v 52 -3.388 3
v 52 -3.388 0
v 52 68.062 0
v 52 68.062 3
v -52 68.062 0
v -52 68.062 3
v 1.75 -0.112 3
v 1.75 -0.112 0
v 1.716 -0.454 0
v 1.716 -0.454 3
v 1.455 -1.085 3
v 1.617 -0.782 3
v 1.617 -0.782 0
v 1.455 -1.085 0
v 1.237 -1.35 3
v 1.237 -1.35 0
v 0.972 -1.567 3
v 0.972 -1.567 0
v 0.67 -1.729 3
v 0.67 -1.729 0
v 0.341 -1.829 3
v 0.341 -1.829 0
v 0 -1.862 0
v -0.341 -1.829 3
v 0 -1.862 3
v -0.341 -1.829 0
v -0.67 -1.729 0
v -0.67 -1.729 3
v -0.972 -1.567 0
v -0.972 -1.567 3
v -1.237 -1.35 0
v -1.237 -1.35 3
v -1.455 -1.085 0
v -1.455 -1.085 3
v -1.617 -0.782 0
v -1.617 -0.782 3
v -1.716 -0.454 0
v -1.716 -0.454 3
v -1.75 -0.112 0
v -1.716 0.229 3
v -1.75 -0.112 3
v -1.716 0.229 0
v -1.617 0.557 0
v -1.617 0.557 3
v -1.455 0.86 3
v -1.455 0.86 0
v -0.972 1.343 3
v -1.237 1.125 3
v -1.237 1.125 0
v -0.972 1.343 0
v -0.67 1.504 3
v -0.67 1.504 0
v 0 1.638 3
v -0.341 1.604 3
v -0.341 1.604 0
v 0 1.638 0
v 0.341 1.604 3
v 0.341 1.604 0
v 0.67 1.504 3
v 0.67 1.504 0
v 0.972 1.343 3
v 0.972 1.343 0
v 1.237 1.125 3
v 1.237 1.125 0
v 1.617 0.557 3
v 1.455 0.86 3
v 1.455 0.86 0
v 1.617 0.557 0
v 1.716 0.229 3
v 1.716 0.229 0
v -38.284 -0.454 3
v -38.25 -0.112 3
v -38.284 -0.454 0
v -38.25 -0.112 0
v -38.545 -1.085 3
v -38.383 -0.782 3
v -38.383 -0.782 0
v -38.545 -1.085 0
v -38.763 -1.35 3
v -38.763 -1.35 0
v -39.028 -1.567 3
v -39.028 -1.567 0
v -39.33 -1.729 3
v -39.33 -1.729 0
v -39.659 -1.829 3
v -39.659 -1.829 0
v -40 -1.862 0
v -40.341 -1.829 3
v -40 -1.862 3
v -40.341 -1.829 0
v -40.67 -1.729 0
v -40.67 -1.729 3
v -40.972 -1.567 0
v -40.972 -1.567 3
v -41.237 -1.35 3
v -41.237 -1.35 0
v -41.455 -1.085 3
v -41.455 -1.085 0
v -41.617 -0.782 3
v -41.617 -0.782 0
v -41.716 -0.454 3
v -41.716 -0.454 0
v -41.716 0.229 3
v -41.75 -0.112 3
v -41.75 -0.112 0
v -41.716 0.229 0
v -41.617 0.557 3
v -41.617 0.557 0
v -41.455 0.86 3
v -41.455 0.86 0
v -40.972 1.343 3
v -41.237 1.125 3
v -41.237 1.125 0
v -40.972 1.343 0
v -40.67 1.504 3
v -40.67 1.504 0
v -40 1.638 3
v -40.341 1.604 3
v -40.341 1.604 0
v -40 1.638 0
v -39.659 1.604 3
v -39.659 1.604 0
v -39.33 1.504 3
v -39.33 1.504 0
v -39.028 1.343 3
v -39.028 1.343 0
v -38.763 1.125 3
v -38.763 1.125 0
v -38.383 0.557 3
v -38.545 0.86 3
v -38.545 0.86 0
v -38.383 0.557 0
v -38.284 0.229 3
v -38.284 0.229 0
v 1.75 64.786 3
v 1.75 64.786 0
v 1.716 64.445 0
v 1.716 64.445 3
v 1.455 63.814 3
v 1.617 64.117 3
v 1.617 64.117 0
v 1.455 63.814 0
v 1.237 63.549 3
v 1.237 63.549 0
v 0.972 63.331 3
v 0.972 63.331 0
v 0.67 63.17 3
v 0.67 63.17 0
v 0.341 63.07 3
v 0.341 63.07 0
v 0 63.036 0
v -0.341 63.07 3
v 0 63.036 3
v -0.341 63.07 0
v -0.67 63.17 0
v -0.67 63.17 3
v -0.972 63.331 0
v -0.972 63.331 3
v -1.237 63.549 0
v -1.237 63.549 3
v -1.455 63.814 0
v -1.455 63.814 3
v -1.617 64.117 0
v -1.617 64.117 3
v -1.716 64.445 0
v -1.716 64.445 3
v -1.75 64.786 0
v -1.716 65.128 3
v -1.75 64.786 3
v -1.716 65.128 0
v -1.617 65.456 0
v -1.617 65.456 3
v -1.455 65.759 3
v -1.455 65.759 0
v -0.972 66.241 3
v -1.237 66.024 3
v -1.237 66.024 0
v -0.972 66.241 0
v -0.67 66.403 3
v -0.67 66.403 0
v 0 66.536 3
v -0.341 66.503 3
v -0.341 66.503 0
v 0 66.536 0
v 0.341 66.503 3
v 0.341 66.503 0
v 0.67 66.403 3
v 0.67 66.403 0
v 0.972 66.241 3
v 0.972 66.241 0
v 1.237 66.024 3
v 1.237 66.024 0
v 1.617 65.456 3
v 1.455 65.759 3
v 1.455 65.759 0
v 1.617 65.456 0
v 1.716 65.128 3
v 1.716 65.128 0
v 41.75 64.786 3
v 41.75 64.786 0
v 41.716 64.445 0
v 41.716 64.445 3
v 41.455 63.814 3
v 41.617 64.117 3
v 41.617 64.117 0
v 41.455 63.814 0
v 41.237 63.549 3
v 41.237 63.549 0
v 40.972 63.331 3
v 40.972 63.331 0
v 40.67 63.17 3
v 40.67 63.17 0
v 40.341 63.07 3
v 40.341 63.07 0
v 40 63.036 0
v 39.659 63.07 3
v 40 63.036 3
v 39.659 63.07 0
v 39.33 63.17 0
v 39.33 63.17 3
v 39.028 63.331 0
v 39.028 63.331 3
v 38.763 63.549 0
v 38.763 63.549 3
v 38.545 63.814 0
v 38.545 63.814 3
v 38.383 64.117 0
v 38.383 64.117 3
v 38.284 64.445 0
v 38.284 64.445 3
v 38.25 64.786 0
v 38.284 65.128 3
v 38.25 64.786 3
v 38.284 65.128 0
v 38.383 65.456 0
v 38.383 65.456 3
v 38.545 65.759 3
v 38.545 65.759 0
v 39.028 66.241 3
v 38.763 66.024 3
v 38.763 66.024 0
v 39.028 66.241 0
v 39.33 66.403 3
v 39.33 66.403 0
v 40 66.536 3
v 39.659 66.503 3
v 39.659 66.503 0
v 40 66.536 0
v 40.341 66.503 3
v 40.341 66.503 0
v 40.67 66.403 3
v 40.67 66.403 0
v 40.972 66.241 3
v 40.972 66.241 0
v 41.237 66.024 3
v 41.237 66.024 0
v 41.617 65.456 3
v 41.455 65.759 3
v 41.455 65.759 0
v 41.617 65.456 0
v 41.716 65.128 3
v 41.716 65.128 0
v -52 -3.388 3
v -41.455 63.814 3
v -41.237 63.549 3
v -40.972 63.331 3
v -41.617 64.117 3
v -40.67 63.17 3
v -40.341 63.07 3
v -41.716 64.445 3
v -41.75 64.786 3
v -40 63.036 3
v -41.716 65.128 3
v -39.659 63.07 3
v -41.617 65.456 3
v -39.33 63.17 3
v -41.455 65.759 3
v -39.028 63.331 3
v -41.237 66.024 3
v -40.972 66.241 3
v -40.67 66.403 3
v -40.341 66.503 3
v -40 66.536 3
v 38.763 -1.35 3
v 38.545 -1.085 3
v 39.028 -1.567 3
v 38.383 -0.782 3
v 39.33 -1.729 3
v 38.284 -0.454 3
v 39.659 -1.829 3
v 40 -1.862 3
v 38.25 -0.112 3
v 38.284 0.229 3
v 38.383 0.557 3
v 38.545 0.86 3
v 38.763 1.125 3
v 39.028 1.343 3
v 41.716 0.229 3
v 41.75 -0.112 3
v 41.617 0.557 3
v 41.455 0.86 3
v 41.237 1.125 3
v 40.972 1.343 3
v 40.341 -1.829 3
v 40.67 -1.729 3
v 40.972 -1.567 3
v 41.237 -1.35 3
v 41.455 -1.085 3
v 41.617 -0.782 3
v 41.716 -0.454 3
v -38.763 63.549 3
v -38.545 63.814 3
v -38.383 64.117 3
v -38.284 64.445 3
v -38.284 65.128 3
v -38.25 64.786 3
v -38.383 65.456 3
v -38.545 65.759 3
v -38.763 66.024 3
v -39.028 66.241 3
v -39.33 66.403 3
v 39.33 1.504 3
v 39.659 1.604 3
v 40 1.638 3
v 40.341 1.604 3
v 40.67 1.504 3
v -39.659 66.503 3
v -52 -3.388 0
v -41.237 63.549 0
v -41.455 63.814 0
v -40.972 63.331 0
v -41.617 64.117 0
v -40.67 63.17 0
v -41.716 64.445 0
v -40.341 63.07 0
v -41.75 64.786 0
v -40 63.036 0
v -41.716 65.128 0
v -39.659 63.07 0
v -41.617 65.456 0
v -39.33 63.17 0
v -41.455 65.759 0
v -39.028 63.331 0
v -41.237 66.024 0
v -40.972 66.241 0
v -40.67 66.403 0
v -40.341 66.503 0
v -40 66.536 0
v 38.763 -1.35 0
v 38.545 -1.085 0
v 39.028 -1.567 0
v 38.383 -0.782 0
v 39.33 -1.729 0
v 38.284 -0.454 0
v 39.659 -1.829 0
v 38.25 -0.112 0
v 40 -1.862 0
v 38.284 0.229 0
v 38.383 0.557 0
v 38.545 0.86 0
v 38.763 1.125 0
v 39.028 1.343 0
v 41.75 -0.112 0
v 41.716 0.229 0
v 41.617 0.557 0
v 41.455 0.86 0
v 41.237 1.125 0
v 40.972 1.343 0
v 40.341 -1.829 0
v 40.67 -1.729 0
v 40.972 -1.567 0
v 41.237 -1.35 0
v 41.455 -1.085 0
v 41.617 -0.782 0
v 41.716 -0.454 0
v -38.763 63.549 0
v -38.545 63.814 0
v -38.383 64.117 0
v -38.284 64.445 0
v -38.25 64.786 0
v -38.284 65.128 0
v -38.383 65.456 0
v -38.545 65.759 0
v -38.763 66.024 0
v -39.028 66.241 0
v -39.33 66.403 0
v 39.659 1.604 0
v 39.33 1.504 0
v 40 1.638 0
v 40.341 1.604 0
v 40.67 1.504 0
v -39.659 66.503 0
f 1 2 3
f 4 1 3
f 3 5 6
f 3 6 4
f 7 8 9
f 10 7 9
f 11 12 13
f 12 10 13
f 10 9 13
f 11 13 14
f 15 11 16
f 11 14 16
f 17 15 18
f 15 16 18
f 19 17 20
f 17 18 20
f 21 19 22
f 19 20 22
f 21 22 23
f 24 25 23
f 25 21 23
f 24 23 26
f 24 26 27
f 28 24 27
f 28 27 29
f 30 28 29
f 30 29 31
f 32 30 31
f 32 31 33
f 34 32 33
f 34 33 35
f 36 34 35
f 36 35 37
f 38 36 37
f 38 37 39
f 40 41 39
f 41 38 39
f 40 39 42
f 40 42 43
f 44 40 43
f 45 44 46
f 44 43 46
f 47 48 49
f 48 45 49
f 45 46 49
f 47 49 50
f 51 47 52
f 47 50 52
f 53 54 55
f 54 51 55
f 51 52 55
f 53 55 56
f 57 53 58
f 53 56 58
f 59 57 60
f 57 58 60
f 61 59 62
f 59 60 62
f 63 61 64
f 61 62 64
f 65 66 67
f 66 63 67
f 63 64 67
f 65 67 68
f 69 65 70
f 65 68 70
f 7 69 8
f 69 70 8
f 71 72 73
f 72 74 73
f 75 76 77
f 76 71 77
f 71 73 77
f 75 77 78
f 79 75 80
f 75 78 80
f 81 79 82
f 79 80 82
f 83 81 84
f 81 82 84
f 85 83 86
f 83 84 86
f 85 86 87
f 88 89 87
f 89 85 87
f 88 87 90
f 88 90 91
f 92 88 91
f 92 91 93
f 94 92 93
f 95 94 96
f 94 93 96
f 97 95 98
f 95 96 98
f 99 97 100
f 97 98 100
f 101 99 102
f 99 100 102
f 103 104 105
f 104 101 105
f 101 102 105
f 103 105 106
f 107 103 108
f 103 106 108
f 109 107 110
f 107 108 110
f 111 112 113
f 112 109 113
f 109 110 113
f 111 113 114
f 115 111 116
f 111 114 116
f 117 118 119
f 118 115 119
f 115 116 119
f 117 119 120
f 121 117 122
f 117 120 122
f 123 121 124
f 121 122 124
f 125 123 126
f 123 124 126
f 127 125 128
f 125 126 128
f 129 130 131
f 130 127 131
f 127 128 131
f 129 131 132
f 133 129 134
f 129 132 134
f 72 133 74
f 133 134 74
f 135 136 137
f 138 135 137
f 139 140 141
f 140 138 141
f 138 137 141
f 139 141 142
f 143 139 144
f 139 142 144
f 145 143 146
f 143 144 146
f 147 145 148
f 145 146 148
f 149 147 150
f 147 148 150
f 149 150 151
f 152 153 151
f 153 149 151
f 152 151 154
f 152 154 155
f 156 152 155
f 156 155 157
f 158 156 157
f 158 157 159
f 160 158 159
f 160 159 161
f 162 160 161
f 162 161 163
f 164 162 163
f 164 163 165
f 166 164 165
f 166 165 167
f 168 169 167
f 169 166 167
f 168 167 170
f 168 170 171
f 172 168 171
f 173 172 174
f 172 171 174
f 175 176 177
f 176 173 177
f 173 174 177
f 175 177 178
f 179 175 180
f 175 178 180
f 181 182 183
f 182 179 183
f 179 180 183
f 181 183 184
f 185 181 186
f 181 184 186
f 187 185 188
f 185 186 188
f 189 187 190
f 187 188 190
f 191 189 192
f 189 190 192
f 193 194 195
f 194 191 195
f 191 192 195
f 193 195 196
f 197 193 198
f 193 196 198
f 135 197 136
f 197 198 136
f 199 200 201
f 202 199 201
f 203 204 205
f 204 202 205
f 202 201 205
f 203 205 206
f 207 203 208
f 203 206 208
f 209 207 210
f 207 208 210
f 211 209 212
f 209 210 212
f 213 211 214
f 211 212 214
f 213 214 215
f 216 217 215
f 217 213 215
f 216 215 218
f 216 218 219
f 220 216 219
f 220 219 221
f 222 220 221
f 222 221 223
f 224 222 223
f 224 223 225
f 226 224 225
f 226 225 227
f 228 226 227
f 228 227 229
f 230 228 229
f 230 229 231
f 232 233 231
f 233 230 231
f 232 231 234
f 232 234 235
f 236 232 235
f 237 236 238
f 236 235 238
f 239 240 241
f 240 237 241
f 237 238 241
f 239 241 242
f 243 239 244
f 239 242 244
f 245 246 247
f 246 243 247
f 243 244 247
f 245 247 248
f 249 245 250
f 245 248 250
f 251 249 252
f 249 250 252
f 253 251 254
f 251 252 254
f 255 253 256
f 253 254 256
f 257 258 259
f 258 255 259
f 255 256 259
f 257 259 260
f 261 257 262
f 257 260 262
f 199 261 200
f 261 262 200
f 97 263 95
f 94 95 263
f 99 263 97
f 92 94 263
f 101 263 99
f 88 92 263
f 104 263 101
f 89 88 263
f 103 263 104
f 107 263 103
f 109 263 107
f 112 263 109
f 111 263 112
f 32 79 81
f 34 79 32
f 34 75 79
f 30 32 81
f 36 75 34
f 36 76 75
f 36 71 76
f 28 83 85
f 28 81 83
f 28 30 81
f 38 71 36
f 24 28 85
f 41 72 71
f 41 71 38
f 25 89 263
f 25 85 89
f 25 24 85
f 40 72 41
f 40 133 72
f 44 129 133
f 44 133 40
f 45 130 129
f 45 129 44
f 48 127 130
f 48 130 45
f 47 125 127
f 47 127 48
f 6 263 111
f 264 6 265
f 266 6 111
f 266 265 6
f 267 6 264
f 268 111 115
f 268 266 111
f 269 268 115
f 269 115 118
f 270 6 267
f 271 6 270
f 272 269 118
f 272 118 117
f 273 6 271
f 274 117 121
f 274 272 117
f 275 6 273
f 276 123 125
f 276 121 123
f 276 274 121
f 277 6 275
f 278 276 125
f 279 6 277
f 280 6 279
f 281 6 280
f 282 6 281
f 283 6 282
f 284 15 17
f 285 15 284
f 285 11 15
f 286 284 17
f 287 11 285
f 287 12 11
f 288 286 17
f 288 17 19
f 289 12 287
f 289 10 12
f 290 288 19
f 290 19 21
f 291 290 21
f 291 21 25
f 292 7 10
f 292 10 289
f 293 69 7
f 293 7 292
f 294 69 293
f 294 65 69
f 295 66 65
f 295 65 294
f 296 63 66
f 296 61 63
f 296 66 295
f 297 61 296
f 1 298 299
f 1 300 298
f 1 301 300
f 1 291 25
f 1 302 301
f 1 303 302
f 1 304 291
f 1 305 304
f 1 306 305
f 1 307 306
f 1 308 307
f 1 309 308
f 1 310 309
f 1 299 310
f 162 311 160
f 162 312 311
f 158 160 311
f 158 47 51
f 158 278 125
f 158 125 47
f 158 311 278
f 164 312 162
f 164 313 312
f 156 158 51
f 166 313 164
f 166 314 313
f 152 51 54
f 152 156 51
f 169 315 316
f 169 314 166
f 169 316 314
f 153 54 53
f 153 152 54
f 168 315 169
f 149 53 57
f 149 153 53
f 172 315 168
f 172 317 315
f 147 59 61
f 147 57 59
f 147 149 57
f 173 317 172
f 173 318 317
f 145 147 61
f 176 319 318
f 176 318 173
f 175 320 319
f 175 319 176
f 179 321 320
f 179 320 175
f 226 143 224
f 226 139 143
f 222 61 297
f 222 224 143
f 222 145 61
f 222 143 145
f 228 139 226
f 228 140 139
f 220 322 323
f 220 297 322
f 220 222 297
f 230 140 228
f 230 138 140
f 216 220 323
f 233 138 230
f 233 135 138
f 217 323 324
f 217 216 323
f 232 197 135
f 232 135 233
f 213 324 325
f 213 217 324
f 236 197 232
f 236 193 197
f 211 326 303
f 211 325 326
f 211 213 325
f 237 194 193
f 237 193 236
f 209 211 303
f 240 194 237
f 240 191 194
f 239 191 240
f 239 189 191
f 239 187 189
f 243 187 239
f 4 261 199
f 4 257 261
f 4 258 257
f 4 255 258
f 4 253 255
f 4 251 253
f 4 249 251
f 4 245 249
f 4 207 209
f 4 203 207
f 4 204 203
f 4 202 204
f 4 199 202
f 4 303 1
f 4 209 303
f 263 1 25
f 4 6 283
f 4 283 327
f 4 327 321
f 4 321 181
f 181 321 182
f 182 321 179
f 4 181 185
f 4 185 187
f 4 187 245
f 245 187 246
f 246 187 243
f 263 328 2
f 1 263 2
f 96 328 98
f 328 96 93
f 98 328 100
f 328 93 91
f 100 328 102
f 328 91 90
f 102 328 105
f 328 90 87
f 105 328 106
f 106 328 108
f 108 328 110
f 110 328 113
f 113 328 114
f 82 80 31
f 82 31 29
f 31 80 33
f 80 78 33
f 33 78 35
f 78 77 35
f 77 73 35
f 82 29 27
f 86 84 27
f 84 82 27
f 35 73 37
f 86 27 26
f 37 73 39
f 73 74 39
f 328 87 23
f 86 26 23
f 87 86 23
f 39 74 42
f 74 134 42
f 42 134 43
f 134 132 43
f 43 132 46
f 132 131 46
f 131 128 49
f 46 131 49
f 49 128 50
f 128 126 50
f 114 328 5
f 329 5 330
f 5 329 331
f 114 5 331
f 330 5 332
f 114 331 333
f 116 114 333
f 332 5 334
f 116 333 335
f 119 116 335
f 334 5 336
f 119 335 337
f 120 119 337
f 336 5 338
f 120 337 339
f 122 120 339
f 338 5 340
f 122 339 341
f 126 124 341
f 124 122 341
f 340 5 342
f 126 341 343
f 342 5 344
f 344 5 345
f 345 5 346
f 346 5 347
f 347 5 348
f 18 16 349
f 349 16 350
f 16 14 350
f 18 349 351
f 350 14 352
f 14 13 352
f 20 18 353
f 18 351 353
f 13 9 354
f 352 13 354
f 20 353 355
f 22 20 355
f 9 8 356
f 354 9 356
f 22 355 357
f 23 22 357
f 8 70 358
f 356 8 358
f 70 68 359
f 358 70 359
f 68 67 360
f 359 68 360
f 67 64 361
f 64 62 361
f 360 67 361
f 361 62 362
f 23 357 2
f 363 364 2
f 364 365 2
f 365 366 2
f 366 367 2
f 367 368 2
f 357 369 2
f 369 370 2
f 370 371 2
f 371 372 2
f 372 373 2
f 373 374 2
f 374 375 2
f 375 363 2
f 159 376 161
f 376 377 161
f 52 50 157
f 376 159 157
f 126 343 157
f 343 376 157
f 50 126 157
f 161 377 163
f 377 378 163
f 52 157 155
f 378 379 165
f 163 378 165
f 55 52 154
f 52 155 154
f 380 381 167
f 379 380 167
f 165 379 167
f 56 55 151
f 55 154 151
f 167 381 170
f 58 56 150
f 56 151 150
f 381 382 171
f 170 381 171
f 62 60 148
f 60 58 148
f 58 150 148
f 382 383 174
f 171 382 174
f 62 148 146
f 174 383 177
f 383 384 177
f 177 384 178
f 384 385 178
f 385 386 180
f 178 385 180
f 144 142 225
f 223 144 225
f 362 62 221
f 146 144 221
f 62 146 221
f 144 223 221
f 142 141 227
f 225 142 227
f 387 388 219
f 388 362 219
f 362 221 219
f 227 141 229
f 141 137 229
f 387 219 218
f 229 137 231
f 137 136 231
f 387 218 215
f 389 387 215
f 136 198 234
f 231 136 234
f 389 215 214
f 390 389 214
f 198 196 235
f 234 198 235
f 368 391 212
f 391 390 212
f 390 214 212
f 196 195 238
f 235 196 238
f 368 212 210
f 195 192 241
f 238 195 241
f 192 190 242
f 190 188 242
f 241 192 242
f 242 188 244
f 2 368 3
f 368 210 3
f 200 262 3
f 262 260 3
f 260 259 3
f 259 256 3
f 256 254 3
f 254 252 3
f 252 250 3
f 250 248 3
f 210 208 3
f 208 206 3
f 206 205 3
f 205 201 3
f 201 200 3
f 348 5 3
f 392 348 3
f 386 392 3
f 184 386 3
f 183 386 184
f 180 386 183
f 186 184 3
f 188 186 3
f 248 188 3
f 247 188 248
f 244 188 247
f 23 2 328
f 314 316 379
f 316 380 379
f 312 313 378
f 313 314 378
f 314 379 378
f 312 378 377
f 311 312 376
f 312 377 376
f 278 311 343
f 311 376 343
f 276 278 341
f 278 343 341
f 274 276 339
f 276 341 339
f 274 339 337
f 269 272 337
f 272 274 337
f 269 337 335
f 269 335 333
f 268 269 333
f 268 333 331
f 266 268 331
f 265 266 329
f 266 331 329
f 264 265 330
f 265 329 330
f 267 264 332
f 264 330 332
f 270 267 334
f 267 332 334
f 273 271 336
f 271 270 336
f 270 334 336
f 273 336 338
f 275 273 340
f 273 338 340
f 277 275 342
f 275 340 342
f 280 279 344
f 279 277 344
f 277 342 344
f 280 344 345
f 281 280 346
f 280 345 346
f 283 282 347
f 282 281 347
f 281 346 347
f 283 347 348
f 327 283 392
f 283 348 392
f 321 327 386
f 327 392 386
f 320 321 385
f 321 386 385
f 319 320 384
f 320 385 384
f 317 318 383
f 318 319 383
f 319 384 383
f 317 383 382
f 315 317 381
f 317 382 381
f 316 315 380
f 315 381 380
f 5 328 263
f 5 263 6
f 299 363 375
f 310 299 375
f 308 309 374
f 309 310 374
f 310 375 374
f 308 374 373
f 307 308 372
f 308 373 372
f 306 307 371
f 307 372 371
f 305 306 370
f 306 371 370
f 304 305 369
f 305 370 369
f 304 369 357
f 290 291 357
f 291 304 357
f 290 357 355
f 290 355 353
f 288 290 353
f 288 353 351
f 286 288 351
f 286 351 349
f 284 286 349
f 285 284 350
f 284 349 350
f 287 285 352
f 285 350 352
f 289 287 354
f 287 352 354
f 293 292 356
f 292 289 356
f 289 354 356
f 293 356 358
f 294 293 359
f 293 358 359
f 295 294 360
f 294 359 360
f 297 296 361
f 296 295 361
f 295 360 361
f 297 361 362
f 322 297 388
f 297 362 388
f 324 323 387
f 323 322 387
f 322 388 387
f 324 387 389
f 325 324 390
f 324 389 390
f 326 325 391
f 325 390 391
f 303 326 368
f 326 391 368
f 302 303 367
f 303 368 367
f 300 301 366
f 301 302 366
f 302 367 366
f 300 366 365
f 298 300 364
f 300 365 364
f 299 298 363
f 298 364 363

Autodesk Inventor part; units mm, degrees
ref_plane "YZ Plane" through (0, 0, 0) normal (1, 0, 0) x (0, 1, 0)
ref_plane "XZ Plane" through (0, 0, 0) normal (0, 1, 0) x (-1, 0, 0)
ref_plane "XY Plane" through (0, 0, 0) normal (0, 0, 1) x (1, 0, 0)
sketch "Sketch1" plane through (0, 0, 0) normal (0, 0, 1) x (1, 0, 0)
  circle A0 centre (40, -0.1123) radius 1.75 projected
  circle A1 centre (0, -0.1123) radius 1.75 projected
  circle A2 centre (-40, -0.1123) radius 1.75 projected
  line L0 (-44, 3.3877) -> (44, 3.3877) projected
  line L1 (-44, -3.3877) -> (-44, 3.3877) projected
  line L2 (44, -3.3877) -> (-44, -3.3877) projected
  line L3 (44, 3.3877) -> (44, -3.3877) projected
  circle A3 centre (-40, 64.7863) radius 1.75 projected
  circle A4 centre (0, 64.7863) radius 1.75 projected
  circle A5 centre (40, 64.7863) radius 1.75 projected
  line L4 (44, 61.2863) -> (-44, 61.2863) projected
  line L5 (44, 68.0616) -> (44, 61.2863) projected
  line L6 (-44, 68.0616) -> (44, 68.0616) projected
  line L7 (-44, 61.2863) -> (-44, 68.0616) projected
  line L8 (44, 68.0616) -> (44, -3.3877) projected
  line L9 (44, -3.3877) -> (47, -3.3877) projected
  line L10 (47, 68.0616) -> (47, -3.3877) projected
  line L11 (44, 68.0616) -> (47, 68.0616) projected
  line L12 (-47, 68.0616) -> (-47, -3.3877) projected
  line L13 (-47, -3.3877) -> (-44, -3.3877) projected
  line L14 (-44, 68.0616) -> (-44, -3.3877) projected
  line L15 (-47, 68.0616) -> (-44, 68.0616) projected
  line L16 (-47, -3.3877) -> (-52, -3.3877)
  line L17 (-52, -3.3877) -> (-52, 68.0616)
  line L18 (-52, 68.0616) -> (-47, 68.0616)
  line L19 (-47, 68.0616) -> (-47, -3.3877)
  line L20 (47, -3.3877) -> (52, -3.3877)
  line L21 (52, -3.3877) -> (52, 68.0616)
  line L22 (52, 68.0616) -> (47, 68.0616)
  line L23 (47, 68.0616) -> (47, -3.3877)
  point P0 (0, 0)
  dimension "d0" = 5
  dimension "d1" = 5
extrude "Extrusion1" add sketch "Sketch1" along normal blind 3
equation "\"BendRadius\" = Thickness"
equation "\"BendReliefWidth\" = Thickness"
equation "\"BendReliefDepth\" = 0.5 * Thickness"
equation "\"CornerReliefSize\" = 4 * Thickness"
equation "\"MinimumRemnant\" = 2 * Thickness"
equation "\"TransitionRadius\" = BendRadius"
equation "\"JacobiRadiusSize\" = Thickness"
equation "\"GapSize\" = Thickness"
equation "\"Thickness\" = 0.5"
properties part number "КВ33.000.104 - Крышка" material "ABS Plastic"
